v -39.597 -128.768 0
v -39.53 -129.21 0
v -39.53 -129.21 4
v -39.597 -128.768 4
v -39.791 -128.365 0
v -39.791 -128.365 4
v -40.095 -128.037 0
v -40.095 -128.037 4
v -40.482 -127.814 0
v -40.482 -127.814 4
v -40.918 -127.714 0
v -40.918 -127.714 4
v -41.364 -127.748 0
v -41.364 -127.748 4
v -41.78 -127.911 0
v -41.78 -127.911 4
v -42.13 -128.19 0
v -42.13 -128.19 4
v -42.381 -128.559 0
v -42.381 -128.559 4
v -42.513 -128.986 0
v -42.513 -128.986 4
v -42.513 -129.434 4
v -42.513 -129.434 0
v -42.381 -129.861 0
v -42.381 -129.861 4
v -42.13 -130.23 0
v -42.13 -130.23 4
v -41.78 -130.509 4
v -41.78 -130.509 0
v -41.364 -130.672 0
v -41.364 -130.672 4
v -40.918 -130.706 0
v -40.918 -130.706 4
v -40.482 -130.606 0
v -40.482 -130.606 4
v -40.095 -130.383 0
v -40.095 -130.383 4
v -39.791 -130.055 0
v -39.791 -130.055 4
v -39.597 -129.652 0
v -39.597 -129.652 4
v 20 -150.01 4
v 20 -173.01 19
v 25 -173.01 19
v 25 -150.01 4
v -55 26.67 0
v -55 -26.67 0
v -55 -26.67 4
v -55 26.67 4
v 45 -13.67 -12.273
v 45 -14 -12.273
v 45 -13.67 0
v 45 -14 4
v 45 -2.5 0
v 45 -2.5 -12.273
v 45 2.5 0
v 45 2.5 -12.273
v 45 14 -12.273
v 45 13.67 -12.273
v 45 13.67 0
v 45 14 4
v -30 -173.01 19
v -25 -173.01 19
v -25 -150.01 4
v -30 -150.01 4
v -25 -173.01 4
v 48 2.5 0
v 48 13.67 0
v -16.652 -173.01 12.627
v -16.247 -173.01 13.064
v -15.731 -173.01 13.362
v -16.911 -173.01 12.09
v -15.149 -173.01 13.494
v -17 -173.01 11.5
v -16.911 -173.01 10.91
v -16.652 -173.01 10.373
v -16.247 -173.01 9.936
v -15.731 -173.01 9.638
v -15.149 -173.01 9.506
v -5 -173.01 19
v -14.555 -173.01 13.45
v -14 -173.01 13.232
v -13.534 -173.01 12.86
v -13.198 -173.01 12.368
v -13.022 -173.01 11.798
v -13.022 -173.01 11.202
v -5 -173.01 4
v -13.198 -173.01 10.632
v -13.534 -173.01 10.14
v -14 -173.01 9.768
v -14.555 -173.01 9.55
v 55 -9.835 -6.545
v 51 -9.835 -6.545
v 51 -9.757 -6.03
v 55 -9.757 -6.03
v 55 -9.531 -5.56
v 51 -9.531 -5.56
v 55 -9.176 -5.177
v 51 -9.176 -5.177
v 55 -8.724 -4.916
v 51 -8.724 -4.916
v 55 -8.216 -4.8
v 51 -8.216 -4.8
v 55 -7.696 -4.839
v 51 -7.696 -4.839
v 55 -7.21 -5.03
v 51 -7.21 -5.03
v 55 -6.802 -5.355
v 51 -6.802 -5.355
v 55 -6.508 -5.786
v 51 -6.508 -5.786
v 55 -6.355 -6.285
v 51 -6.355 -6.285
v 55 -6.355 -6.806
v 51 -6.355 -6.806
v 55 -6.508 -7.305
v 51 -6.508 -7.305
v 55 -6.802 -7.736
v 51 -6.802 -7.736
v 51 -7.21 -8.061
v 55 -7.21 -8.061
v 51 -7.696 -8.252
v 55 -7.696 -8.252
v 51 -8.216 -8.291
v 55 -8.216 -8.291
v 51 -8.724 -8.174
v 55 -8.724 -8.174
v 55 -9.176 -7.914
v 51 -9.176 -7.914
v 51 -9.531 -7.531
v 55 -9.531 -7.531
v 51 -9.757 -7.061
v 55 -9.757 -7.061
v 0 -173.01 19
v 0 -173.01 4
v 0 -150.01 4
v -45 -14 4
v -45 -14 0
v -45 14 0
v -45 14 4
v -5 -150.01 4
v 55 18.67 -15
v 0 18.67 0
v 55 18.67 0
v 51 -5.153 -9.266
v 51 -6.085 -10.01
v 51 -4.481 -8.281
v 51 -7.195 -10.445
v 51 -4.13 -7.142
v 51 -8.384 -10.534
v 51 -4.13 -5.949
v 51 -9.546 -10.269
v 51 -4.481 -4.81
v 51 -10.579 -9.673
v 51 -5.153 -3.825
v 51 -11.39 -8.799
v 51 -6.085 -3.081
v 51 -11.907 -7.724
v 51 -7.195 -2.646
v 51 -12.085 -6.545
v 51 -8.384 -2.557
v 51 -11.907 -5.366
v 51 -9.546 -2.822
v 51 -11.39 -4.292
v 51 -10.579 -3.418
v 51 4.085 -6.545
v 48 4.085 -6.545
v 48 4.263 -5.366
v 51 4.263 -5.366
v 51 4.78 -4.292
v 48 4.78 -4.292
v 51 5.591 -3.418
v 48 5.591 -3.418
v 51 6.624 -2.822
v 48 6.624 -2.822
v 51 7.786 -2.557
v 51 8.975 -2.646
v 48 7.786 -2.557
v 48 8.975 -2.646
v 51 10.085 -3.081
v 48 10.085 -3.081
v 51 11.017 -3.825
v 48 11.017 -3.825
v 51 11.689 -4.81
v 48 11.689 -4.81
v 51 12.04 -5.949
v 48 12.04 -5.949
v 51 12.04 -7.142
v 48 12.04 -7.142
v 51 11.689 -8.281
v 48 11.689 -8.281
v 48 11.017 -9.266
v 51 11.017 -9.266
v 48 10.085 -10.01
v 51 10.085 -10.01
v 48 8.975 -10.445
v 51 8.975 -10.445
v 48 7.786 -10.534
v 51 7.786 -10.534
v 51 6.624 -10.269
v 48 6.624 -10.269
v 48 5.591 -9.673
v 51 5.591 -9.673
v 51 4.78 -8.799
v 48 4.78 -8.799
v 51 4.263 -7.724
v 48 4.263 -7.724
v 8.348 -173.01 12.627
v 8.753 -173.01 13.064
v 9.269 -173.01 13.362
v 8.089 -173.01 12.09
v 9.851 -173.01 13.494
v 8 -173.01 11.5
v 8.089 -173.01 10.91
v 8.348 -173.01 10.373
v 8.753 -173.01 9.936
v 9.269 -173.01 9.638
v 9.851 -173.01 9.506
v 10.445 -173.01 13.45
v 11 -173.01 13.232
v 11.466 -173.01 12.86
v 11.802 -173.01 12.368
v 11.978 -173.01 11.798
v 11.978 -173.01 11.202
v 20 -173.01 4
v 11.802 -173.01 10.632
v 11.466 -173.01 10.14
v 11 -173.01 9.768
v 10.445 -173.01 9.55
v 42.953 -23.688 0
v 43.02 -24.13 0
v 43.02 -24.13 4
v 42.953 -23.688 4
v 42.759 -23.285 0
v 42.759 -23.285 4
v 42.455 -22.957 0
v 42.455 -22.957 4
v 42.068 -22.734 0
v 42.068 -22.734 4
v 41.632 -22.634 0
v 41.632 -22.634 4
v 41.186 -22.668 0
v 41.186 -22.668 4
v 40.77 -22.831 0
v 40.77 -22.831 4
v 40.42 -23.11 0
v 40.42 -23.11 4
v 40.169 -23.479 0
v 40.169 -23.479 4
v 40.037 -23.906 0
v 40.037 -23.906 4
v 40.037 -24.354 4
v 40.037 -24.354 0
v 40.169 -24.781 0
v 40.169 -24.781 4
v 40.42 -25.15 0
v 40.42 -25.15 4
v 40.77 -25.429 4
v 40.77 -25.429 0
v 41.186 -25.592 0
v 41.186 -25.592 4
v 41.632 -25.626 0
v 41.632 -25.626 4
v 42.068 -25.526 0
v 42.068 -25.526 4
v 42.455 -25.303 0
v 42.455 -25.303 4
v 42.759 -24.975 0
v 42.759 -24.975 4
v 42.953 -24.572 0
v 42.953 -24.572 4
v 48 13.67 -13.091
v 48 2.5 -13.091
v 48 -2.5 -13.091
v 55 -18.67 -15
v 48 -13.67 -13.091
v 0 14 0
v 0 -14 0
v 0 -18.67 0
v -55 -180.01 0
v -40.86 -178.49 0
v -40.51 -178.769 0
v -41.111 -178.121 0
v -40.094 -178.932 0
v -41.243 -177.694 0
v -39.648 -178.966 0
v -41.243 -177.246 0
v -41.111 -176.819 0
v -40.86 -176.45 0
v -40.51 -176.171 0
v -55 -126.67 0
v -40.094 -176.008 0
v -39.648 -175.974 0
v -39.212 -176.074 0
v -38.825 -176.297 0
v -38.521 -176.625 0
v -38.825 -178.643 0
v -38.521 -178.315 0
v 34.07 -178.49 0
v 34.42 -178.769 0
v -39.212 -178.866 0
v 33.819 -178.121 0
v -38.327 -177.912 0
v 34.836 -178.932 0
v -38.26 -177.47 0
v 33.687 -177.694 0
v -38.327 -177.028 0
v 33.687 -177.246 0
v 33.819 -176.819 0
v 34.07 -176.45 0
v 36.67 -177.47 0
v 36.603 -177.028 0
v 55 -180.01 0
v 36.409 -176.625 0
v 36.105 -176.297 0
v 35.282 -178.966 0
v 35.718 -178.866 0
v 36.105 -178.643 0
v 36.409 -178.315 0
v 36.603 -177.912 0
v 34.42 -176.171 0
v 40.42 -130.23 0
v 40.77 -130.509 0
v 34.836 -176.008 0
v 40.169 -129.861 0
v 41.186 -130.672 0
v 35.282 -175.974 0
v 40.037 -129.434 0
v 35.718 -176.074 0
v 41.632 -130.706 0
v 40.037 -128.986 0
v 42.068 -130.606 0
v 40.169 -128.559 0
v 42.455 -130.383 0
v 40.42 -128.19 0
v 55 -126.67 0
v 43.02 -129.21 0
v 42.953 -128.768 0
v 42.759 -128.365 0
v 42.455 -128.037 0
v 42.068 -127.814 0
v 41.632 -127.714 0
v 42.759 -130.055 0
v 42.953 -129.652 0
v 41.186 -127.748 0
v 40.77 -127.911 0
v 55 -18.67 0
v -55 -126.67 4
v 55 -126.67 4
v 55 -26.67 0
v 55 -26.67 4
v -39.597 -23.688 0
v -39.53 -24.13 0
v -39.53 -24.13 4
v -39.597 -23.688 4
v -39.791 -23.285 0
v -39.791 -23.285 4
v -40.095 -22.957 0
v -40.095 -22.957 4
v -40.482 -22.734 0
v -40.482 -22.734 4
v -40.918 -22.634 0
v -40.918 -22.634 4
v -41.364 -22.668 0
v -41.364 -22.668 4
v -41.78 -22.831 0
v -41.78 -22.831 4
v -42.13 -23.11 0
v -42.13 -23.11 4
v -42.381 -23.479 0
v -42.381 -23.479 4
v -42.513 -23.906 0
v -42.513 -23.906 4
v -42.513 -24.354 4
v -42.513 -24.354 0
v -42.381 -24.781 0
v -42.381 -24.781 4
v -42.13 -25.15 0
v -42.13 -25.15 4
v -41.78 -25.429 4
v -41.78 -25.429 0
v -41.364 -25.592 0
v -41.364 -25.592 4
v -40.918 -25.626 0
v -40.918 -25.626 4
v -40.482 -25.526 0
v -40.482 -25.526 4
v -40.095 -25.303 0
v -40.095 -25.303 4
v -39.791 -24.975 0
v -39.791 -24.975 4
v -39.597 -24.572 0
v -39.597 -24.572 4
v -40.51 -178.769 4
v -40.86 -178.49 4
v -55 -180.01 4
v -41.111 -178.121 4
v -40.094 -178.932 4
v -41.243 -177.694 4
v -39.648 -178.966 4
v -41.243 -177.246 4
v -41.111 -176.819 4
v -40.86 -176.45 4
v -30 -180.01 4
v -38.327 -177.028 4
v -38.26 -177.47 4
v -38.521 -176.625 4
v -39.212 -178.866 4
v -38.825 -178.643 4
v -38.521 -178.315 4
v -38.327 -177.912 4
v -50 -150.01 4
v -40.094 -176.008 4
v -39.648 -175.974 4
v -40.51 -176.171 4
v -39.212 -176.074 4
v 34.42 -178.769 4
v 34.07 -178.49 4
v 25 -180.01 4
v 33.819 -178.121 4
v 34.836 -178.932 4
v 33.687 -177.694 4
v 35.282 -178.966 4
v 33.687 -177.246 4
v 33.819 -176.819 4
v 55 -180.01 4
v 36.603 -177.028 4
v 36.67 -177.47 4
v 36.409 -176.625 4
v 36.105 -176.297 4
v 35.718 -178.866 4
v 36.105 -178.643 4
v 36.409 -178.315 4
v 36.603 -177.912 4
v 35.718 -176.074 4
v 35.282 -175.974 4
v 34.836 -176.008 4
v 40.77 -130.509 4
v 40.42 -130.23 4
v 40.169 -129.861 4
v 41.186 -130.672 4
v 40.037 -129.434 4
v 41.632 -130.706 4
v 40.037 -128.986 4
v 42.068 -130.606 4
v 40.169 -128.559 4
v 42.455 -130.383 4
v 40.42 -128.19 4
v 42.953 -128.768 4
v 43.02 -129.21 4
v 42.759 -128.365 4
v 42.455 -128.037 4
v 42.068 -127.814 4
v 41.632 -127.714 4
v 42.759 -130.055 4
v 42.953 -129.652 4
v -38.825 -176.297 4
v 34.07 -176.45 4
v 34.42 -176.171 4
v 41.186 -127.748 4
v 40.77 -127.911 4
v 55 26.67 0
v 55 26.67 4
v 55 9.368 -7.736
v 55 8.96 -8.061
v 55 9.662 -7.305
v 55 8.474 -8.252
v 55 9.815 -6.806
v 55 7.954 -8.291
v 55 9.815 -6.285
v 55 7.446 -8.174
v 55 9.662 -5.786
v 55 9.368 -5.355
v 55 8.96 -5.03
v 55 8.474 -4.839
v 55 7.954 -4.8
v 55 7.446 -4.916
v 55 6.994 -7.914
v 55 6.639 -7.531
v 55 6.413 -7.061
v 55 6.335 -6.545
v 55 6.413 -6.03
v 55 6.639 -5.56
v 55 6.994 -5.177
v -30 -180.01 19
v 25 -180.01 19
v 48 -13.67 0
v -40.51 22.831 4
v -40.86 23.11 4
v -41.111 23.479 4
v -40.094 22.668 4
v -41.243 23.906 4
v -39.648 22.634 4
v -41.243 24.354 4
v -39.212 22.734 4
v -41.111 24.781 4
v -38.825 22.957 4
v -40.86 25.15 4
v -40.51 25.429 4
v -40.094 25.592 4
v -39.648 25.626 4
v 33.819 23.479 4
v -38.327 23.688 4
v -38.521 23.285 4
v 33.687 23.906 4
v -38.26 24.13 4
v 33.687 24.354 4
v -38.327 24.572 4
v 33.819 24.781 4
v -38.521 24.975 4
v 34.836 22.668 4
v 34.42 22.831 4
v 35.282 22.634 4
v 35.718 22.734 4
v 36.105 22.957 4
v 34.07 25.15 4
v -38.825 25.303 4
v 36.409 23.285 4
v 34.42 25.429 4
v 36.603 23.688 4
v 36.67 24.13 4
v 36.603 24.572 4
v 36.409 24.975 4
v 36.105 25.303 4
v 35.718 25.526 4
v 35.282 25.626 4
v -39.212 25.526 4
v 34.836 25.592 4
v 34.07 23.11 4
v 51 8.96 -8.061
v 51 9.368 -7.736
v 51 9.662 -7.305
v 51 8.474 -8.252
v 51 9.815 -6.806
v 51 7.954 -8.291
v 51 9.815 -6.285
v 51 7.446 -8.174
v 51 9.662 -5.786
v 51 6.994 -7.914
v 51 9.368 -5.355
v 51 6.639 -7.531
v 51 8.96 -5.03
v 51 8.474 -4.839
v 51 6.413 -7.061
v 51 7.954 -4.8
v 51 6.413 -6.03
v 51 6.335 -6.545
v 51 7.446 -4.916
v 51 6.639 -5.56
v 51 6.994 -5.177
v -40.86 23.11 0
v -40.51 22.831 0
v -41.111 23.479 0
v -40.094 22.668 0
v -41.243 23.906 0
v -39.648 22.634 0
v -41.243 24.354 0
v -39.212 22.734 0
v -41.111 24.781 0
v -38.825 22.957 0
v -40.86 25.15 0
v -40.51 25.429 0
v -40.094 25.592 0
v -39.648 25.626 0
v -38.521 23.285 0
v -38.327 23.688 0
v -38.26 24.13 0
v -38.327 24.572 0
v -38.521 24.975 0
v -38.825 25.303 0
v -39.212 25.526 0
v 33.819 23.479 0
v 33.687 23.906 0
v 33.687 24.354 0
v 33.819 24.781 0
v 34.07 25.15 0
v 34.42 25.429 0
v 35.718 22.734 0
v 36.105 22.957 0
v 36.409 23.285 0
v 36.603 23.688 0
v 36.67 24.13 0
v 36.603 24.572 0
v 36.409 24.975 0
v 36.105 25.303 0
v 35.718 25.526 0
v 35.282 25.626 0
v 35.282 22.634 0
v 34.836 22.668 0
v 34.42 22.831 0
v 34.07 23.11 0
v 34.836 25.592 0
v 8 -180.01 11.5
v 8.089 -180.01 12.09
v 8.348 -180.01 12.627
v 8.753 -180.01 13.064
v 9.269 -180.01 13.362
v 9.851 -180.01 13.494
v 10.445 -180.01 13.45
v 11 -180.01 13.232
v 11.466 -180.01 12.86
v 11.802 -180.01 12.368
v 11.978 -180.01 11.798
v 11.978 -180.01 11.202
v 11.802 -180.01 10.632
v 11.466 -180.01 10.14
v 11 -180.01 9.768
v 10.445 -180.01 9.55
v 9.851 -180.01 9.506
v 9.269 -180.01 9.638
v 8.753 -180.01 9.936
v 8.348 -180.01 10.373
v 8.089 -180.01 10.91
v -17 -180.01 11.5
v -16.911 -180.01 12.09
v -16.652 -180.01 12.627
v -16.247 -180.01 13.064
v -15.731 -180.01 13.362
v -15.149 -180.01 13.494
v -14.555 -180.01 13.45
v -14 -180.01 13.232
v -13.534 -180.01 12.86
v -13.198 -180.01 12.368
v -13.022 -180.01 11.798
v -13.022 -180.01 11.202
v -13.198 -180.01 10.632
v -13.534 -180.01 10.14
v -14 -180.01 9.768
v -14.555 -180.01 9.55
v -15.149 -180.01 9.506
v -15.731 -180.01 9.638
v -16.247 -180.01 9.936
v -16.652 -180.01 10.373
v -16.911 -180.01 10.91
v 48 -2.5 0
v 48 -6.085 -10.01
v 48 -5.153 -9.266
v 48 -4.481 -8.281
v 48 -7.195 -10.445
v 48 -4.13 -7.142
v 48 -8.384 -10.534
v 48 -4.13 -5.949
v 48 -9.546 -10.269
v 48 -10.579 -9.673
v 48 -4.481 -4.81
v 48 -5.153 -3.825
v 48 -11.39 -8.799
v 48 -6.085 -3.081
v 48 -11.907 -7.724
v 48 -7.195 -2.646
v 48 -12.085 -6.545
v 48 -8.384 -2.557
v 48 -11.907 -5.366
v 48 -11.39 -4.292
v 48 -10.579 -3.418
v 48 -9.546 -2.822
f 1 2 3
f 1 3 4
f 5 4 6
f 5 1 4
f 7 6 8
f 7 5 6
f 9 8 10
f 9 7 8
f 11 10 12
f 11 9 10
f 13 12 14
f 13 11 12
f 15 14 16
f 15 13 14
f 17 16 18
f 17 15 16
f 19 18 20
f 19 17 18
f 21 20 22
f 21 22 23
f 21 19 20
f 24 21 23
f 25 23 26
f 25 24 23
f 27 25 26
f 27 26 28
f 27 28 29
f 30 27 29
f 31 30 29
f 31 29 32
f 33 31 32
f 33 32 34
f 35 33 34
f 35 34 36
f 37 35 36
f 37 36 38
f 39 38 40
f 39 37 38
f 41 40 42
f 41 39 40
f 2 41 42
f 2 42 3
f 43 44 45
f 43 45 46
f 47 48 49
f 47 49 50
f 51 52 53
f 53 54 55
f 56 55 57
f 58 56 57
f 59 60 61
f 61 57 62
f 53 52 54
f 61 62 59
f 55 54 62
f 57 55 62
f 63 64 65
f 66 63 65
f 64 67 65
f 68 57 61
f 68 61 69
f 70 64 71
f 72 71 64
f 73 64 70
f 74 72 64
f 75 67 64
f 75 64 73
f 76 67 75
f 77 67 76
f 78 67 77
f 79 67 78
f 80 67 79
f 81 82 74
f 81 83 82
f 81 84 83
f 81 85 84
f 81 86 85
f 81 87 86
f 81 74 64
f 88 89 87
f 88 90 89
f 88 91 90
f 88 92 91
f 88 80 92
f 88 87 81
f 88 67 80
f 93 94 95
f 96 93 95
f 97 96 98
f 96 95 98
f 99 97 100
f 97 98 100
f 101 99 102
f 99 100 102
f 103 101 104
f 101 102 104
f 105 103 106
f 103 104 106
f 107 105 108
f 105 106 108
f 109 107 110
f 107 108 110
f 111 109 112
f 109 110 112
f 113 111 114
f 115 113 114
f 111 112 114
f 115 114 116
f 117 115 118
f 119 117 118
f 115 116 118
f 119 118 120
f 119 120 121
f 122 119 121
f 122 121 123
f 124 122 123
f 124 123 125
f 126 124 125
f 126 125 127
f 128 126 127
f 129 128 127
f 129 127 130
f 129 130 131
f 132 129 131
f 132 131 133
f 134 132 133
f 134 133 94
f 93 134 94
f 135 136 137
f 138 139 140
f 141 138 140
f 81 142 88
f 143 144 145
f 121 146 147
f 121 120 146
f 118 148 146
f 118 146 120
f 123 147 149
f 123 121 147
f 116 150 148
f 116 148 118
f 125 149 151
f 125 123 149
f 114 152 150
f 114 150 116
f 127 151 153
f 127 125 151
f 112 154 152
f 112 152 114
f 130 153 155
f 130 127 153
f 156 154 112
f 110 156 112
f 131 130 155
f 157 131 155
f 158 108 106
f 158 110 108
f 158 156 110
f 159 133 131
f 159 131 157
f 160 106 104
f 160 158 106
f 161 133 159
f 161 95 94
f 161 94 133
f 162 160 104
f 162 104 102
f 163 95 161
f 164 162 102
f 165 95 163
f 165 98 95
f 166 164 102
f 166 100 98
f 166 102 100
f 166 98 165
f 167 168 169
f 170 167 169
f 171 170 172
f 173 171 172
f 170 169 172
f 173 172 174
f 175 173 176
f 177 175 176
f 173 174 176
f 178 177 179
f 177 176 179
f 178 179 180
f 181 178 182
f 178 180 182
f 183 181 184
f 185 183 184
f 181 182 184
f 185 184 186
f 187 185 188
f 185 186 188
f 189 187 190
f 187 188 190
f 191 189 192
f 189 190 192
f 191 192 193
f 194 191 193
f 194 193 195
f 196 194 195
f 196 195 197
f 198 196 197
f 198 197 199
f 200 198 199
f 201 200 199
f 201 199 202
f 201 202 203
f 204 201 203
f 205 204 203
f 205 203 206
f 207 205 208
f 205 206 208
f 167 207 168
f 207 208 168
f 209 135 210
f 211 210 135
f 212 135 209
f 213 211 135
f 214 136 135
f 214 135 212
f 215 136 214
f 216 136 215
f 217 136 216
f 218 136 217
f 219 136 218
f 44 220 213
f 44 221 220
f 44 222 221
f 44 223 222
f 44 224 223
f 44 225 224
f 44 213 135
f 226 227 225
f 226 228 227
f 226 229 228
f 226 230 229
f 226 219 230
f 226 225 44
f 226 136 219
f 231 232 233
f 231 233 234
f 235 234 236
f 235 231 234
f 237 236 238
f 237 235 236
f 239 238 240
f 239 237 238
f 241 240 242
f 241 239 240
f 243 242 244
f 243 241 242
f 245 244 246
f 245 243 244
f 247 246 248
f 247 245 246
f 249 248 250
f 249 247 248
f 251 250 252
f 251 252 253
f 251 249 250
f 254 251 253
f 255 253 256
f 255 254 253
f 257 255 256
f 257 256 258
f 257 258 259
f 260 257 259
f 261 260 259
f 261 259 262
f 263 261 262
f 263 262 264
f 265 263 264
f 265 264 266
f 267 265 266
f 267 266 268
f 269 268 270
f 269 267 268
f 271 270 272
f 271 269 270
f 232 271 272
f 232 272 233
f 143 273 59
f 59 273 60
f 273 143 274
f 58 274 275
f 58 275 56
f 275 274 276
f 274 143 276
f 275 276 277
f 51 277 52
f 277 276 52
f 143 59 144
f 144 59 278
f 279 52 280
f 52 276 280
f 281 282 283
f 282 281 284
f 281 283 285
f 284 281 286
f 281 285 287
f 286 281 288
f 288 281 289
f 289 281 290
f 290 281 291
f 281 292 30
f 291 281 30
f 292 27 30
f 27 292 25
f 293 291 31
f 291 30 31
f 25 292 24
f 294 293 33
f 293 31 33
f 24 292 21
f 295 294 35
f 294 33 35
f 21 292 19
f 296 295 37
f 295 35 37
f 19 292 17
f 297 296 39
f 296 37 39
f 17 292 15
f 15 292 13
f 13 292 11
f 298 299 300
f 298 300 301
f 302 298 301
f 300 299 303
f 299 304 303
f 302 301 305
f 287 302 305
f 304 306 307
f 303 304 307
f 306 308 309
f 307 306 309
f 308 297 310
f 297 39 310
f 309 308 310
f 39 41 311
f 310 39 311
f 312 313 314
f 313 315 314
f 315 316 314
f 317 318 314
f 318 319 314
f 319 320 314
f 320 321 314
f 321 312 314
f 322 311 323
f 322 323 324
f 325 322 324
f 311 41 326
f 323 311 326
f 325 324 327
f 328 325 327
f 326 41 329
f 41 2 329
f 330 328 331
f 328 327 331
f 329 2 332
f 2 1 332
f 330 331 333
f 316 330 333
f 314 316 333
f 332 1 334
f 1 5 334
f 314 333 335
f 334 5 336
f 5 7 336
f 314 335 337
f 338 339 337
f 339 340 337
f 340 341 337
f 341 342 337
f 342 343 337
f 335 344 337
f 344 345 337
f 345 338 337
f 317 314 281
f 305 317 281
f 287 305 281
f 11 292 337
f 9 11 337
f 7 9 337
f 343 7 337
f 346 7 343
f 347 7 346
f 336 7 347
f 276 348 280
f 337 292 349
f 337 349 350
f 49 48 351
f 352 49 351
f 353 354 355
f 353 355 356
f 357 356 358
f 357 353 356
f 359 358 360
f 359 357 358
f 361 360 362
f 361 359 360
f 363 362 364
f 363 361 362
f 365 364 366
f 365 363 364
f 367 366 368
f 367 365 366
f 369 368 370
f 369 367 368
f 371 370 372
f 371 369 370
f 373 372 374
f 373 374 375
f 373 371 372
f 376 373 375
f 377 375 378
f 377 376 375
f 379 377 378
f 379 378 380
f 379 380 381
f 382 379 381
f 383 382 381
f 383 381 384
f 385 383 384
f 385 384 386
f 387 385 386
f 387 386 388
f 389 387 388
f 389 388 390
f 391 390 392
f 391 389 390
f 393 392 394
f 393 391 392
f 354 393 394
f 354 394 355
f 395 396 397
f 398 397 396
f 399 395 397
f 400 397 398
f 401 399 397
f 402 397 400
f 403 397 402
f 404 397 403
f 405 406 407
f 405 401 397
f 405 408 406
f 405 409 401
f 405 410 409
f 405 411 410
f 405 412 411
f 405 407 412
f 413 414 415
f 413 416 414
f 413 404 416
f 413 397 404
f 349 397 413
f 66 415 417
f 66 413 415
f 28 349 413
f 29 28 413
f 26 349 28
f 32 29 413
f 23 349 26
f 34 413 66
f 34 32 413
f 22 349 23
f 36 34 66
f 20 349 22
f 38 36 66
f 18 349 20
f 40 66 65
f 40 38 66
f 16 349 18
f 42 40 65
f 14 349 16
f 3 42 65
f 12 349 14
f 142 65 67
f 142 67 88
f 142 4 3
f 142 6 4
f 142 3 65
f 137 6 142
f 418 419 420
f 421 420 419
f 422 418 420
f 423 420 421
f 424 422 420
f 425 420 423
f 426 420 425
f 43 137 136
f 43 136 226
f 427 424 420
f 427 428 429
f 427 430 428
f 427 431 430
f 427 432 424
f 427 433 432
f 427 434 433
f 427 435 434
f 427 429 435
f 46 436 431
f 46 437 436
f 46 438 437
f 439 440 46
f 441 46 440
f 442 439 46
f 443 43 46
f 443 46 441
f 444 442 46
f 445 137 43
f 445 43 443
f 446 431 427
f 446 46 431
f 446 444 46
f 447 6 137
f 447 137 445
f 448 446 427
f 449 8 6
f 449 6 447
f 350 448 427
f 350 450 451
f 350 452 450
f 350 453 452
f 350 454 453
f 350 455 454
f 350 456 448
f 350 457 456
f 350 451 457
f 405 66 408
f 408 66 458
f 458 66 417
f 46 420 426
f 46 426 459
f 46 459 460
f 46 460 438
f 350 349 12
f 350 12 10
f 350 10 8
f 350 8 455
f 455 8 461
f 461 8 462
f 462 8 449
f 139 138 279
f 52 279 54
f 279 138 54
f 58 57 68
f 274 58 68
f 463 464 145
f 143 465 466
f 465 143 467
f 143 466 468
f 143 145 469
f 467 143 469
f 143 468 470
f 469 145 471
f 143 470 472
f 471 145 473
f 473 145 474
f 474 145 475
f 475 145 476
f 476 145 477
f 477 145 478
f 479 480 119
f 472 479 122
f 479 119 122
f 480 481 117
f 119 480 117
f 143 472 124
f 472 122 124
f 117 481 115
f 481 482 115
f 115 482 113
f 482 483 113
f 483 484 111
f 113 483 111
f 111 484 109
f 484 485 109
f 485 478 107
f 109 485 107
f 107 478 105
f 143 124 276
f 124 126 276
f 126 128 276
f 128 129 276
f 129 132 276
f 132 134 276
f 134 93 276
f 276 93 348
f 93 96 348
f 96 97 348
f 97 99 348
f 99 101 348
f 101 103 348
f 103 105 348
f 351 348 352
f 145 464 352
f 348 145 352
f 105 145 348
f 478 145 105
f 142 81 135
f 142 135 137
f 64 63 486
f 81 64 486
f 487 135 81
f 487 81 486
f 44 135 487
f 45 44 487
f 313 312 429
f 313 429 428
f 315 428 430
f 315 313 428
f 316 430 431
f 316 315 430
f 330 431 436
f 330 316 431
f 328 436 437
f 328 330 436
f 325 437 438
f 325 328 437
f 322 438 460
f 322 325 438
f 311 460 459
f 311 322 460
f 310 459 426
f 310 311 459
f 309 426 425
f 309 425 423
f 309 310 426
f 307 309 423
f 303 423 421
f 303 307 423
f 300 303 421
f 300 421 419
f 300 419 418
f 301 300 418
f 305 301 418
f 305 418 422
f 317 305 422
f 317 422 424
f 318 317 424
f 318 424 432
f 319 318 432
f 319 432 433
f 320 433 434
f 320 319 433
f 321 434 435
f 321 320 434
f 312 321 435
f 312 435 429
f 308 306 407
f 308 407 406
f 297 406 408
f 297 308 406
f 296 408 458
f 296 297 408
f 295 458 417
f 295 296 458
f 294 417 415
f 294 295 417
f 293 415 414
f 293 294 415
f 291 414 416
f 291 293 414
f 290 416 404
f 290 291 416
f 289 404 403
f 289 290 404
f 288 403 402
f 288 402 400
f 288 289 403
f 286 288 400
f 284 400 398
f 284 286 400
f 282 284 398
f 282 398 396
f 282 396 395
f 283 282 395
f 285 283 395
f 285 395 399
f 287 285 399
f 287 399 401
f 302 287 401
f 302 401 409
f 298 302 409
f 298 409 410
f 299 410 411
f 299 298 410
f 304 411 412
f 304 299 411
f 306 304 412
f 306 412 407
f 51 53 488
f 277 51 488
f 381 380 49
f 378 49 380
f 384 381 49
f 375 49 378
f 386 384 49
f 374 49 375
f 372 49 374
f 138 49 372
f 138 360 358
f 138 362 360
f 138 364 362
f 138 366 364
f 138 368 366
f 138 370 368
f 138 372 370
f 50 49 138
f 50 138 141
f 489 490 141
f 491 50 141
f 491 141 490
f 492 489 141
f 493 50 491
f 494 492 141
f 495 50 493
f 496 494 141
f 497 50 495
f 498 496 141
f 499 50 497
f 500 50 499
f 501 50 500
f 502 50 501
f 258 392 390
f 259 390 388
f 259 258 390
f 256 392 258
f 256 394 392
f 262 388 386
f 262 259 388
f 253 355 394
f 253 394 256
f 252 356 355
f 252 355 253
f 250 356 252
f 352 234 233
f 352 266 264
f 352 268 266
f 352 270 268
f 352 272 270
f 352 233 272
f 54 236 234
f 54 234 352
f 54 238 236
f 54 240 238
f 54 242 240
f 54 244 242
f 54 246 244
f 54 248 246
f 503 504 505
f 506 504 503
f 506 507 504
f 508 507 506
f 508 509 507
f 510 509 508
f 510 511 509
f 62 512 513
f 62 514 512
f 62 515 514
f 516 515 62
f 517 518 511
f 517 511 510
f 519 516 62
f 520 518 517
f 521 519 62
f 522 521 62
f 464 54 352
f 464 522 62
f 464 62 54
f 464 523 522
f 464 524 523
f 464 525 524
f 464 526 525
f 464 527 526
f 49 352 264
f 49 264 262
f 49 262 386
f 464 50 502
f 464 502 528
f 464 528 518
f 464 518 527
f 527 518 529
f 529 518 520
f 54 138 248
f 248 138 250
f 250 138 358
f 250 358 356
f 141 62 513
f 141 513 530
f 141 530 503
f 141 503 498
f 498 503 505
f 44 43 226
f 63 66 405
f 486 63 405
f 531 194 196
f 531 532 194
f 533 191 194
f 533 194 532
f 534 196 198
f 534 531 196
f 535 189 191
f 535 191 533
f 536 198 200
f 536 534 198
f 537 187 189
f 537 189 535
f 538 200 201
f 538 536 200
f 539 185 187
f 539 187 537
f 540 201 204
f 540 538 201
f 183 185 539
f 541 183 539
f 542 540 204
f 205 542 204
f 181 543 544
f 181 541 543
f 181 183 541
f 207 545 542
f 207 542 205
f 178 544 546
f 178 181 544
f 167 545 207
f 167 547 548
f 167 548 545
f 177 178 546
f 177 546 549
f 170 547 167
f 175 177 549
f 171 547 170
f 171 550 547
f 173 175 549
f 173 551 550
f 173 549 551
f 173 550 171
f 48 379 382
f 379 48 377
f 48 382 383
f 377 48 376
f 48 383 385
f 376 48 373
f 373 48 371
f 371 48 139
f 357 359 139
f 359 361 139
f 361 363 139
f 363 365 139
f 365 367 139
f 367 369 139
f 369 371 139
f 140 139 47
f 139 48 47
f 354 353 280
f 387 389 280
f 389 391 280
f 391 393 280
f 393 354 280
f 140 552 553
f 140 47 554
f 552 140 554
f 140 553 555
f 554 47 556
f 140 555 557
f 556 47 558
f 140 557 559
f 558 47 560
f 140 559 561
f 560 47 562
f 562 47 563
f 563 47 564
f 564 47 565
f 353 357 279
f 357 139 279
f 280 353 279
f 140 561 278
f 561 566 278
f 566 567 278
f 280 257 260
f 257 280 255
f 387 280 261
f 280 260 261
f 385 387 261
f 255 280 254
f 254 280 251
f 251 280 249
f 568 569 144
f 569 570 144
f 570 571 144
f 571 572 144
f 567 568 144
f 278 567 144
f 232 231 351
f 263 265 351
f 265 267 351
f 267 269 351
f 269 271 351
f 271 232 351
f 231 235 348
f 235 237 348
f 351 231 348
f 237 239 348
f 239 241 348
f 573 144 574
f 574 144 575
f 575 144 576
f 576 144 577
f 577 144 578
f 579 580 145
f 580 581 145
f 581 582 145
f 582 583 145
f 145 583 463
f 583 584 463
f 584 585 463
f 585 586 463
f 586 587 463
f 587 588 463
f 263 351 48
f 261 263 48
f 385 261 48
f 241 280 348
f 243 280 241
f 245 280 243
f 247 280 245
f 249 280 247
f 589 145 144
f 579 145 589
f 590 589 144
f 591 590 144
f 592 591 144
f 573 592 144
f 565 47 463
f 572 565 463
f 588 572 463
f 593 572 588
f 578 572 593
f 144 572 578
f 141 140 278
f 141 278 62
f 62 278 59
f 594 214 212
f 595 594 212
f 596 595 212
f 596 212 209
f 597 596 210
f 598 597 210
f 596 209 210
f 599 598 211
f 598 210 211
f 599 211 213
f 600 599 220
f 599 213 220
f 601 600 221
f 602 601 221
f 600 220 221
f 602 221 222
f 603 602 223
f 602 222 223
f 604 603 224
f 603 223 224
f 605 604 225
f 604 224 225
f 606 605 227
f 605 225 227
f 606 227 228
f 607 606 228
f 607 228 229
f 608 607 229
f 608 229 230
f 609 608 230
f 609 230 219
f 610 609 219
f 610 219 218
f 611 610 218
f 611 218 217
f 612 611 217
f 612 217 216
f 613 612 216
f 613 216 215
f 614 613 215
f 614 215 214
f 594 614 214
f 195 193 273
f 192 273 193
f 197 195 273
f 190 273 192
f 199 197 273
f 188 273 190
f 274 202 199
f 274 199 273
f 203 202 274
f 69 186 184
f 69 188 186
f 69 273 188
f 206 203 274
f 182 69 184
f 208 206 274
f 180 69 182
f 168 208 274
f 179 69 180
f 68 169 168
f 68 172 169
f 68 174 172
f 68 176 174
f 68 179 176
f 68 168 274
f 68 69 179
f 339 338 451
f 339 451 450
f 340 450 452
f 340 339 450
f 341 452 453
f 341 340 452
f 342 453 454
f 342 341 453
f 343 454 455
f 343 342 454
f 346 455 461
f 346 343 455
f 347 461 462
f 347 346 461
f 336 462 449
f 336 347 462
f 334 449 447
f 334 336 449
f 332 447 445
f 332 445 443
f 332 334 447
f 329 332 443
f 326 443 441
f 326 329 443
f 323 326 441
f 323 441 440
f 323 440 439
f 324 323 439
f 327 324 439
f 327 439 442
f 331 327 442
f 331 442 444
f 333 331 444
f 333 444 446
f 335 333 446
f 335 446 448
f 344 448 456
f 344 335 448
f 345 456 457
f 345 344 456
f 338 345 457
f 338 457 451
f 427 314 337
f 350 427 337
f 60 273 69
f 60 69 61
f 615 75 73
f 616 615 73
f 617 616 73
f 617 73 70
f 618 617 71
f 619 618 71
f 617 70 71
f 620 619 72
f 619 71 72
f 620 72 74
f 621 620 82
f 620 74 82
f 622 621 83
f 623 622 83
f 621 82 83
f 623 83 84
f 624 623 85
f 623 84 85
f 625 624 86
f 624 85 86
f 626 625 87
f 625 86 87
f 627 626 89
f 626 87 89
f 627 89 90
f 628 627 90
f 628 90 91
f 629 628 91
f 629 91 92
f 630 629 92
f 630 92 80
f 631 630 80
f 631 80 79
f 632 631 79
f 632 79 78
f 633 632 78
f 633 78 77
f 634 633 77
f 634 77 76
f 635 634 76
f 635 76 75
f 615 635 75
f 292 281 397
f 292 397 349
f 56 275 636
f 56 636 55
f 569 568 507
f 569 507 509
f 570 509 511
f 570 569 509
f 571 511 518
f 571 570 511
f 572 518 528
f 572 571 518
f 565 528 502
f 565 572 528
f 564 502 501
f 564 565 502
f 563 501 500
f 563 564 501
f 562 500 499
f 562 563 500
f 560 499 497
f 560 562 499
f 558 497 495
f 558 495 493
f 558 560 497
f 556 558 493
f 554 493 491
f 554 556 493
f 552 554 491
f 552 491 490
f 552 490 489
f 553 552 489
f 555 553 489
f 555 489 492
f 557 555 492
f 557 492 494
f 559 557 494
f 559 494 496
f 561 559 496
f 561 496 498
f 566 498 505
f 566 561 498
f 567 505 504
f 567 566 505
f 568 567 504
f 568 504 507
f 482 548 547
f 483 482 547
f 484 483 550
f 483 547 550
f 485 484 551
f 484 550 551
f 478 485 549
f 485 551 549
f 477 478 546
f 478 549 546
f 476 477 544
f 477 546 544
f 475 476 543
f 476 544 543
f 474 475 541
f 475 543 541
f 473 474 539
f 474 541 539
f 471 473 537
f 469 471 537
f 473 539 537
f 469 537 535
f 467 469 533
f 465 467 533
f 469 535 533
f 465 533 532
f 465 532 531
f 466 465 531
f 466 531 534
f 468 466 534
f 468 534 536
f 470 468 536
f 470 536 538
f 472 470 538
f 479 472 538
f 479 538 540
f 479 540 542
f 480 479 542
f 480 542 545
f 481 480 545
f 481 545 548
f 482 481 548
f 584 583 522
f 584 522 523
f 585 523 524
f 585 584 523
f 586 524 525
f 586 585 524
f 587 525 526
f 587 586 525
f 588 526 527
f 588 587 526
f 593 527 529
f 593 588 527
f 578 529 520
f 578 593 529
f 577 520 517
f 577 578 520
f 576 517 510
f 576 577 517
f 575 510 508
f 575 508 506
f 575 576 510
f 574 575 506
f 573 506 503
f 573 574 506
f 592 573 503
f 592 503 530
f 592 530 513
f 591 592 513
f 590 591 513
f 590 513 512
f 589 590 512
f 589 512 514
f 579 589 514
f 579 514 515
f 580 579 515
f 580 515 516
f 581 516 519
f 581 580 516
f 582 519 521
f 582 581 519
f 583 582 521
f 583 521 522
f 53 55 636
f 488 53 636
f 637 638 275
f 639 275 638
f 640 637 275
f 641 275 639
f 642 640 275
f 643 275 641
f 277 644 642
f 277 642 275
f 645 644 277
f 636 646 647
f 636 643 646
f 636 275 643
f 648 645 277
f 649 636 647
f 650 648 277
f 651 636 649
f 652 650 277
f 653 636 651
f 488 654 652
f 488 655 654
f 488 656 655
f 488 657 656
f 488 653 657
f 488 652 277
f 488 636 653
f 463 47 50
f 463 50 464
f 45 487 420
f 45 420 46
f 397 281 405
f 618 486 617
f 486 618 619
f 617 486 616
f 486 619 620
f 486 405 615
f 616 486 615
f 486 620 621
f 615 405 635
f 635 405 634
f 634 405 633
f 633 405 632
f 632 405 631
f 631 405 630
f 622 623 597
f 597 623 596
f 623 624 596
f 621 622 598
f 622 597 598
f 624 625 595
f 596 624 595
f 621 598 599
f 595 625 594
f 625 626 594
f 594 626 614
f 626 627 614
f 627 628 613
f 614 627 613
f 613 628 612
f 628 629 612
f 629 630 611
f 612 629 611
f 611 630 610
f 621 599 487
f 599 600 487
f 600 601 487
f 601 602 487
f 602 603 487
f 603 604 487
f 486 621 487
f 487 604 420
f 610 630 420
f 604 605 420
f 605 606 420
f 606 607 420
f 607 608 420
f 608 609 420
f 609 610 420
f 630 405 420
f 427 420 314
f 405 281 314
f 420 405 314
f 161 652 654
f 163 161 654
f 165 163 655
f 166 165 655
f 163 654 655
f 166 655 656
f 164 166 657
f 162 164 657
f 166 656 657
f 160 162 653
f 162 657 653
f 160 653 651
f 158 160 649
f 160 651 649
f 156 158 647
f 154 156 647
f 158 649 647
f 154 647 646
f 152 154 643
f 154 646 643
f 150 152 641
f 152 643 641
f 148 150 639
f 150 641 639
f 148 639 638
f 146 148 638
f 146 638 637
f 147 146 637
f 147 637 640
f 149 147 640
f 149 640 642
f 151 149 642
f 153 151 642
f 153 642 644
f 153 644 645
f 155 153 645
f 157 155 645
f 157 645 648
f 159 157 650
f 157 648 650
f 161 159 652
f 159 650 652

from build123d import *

# Parameters (mm, degrees)
F0_W           = 110
F0_H           = 53.34
F0_R           = 1.5
F0_W_2         = 90
F0_H_2         = 28
F1_DEPTH       = 4
F2_W           = 7
F2_H           = 11.17
F3_DEPTH       = 15
F5_DEPTH       = 60
F6_R           = 1.75
F7_DEPTH       = 8
F8_W           = 20
F8_H           = 7
F9_DEPTH       = 15
F11_DEPTH      = 50
F11_DEPTH_BACK = 25
F12_R          = 2
F13_DEPTH      = 25
F14_R          = 4
F15_DEPTH      = 3


with BuildPart() as f1:
    # F0 (on Top) → F1 (new body)
    with BuildSketch(Plane.XY):
        Rectangle(F0_W, F0_H)
        with Locations((-41.03, -24.13)):
            Circle(F0_R, mode=Mode.SUBTRACT)
        with Locations((-39.76, 24.13)):
            Circle(F0_R, mode=Mode.SUBTRACT)
        Rectangle(F0_W_2, F0_H_2, mode=Mode.SUBTRACT)
        with Locations((41.52, -24.13)):
            Circle(F0_R, mode=Mode.SUBTRACT)
        with Locations((35.17, 24.13)):
            Circle(F0_R, mode=Mode.SUBTRACT)
    extrude(amount=F1_DEPTH)

    # F2 (on face) → F3 (join)
    with BuildSketch(Plane(origin=(0, 0, 0), x_dir=(1, 0, 0), z_dir=(0, 0, -1))):
        Polygon((55, 13.67), (55, 18.67), (0, 18.67), (0, 14), (45, 14), (45, 13.67), (48, 13.67), align=None)
        Polygon((55, -2.5), (55, 2.5), (48, 2.5), (45, 2.5), (45, -2.5), (48, -2.5), align=None)
        Polygon((55, -18.67), (55, -13.67), (48, -13.67), (45, -13.67), (45, -14), (0, -14), (0, -18.67), align=None)
        with Locations((51.5, 8.085)):
            Rectangle(F2_W, F2_H)
        with Locations((51.5, -8.085)):
            Rectangle(F2_W, F2_H)
    extrude(amount=F3_DEPTH)

    # F4 (on face) → F5 (cut)
    with BuildSketch(Plane.XZ.offset(18.67)):
        Polygon((55, -15), (0, 0), (0, -15), align=None)
    extrude(amount=-F5_DEPTH, mode=Mode.SUBTRACT)

    # F6 (on face) → F7 (cut)
    with BuildSketch(Plane(origin=(48, 0, 0), x_dir=(0, -1, 0), z_dir=(-1, 0, 0))):
        with Locations((8.085, -6.5454545455)):
            Circle(F6_R)
        with Locations((-8.085, -6.5454545455)):
            Circle(F6_R)
    extrude(amount=-F7_DEPTH, mode=Mode.SUBTRACT)

    # F14 (on face) → F15 (cut)
    with BuildSketch(Plane(origin=(48, 0, 0), x_dir=(0, -1, 0), z_dir=(-1, 0, 0))):
        with Locations((-8.085, -6.5454545455)):
            Circle(F14_R)
        with Locations((8.085, -6.5454545455)):
            Circle(F14_R)
    extrude(amount=-F15_DEPTH, mode=Mode.SUBTRACT)


with BuildPart() as f1b:
    # F0 (on Top) → F1, piece 2 (new body)
    with BuildSketch(Plane.XY):
        with Locations((0, -153.34)):
            Rectangle(F0_W, F0_H)
        with Locations((-39.76, -177.47)):
            Circle(F0_R, mode=Mode.SUBTRACT)
        with Locations((-41.03, -129.21)):
            Circle(F0_R, mode=Mode.SUBTRACT)
        with Locations((35.17, -177.47)):
            Circle(F0_R, mode=Mode.SUBTRACT)
        with Locations((41.52, -129.21)):
            Circle(F0_R, mode=Mode.SUBTRACT)
    extrude(amount=F1_DEPTH)

    # F8 (on face) → F9 (join)
    with BuildSketch(Plane.XY.offset(4)):
        Polygon((-30, -150.01), (-30, -180.01), (-25, -180.01), (-25, -173.01), (-25, -150.01), align=None)
        Polygon((20, -150.01), (20, -173.01), (20, -180.01), (25, -180.01), (25, -150.01), align=None)
        with Locations((-15, -176.51)):
            Rectangle(F8_W, F8_H)
        Polygon((-5, -173.01), (-5, -180.01), (0, -180.01), (0, -173.01), (0, -150.01), (-5, -150.01), align=None)
        with Locations((10, -176.51)):
            Rectangle(F8_W, F8_H)
    extrude(amount=F9_DEPTH)

    # F10 (on face) → F11 (cut, two sides)
    with BuildSketch(Plane.YZ.offset(-25)) as f11_sk:
        Polygon((-150.01, 19), (-173.01, 19), (-150.01, 4), align=None)
    extrude(amount=F11_DEPTH, mode=Mode.SUBTRACT)
    extrude(f11_sk.sketch, amount=-F11_DEPTH_BACK, mode=Mode.SUBTRACT)

    # F12 (on face) → F13 (cut)
    with BuildSketch(Plane(origin=(0, -173.01, 0), x_dir=(-1, 0, 0), z_dir=(0, 1, 0))):
        with Locations((15, 11.5)):
            Circle(F12_R)
        with Locations((-10, 11.5)):
            Circle(F12_R)
    extrude(amount=-F13_DEPTH, mode=Mode.SUBTRACT)


solid = Compound([f1.part, f1b.part])
